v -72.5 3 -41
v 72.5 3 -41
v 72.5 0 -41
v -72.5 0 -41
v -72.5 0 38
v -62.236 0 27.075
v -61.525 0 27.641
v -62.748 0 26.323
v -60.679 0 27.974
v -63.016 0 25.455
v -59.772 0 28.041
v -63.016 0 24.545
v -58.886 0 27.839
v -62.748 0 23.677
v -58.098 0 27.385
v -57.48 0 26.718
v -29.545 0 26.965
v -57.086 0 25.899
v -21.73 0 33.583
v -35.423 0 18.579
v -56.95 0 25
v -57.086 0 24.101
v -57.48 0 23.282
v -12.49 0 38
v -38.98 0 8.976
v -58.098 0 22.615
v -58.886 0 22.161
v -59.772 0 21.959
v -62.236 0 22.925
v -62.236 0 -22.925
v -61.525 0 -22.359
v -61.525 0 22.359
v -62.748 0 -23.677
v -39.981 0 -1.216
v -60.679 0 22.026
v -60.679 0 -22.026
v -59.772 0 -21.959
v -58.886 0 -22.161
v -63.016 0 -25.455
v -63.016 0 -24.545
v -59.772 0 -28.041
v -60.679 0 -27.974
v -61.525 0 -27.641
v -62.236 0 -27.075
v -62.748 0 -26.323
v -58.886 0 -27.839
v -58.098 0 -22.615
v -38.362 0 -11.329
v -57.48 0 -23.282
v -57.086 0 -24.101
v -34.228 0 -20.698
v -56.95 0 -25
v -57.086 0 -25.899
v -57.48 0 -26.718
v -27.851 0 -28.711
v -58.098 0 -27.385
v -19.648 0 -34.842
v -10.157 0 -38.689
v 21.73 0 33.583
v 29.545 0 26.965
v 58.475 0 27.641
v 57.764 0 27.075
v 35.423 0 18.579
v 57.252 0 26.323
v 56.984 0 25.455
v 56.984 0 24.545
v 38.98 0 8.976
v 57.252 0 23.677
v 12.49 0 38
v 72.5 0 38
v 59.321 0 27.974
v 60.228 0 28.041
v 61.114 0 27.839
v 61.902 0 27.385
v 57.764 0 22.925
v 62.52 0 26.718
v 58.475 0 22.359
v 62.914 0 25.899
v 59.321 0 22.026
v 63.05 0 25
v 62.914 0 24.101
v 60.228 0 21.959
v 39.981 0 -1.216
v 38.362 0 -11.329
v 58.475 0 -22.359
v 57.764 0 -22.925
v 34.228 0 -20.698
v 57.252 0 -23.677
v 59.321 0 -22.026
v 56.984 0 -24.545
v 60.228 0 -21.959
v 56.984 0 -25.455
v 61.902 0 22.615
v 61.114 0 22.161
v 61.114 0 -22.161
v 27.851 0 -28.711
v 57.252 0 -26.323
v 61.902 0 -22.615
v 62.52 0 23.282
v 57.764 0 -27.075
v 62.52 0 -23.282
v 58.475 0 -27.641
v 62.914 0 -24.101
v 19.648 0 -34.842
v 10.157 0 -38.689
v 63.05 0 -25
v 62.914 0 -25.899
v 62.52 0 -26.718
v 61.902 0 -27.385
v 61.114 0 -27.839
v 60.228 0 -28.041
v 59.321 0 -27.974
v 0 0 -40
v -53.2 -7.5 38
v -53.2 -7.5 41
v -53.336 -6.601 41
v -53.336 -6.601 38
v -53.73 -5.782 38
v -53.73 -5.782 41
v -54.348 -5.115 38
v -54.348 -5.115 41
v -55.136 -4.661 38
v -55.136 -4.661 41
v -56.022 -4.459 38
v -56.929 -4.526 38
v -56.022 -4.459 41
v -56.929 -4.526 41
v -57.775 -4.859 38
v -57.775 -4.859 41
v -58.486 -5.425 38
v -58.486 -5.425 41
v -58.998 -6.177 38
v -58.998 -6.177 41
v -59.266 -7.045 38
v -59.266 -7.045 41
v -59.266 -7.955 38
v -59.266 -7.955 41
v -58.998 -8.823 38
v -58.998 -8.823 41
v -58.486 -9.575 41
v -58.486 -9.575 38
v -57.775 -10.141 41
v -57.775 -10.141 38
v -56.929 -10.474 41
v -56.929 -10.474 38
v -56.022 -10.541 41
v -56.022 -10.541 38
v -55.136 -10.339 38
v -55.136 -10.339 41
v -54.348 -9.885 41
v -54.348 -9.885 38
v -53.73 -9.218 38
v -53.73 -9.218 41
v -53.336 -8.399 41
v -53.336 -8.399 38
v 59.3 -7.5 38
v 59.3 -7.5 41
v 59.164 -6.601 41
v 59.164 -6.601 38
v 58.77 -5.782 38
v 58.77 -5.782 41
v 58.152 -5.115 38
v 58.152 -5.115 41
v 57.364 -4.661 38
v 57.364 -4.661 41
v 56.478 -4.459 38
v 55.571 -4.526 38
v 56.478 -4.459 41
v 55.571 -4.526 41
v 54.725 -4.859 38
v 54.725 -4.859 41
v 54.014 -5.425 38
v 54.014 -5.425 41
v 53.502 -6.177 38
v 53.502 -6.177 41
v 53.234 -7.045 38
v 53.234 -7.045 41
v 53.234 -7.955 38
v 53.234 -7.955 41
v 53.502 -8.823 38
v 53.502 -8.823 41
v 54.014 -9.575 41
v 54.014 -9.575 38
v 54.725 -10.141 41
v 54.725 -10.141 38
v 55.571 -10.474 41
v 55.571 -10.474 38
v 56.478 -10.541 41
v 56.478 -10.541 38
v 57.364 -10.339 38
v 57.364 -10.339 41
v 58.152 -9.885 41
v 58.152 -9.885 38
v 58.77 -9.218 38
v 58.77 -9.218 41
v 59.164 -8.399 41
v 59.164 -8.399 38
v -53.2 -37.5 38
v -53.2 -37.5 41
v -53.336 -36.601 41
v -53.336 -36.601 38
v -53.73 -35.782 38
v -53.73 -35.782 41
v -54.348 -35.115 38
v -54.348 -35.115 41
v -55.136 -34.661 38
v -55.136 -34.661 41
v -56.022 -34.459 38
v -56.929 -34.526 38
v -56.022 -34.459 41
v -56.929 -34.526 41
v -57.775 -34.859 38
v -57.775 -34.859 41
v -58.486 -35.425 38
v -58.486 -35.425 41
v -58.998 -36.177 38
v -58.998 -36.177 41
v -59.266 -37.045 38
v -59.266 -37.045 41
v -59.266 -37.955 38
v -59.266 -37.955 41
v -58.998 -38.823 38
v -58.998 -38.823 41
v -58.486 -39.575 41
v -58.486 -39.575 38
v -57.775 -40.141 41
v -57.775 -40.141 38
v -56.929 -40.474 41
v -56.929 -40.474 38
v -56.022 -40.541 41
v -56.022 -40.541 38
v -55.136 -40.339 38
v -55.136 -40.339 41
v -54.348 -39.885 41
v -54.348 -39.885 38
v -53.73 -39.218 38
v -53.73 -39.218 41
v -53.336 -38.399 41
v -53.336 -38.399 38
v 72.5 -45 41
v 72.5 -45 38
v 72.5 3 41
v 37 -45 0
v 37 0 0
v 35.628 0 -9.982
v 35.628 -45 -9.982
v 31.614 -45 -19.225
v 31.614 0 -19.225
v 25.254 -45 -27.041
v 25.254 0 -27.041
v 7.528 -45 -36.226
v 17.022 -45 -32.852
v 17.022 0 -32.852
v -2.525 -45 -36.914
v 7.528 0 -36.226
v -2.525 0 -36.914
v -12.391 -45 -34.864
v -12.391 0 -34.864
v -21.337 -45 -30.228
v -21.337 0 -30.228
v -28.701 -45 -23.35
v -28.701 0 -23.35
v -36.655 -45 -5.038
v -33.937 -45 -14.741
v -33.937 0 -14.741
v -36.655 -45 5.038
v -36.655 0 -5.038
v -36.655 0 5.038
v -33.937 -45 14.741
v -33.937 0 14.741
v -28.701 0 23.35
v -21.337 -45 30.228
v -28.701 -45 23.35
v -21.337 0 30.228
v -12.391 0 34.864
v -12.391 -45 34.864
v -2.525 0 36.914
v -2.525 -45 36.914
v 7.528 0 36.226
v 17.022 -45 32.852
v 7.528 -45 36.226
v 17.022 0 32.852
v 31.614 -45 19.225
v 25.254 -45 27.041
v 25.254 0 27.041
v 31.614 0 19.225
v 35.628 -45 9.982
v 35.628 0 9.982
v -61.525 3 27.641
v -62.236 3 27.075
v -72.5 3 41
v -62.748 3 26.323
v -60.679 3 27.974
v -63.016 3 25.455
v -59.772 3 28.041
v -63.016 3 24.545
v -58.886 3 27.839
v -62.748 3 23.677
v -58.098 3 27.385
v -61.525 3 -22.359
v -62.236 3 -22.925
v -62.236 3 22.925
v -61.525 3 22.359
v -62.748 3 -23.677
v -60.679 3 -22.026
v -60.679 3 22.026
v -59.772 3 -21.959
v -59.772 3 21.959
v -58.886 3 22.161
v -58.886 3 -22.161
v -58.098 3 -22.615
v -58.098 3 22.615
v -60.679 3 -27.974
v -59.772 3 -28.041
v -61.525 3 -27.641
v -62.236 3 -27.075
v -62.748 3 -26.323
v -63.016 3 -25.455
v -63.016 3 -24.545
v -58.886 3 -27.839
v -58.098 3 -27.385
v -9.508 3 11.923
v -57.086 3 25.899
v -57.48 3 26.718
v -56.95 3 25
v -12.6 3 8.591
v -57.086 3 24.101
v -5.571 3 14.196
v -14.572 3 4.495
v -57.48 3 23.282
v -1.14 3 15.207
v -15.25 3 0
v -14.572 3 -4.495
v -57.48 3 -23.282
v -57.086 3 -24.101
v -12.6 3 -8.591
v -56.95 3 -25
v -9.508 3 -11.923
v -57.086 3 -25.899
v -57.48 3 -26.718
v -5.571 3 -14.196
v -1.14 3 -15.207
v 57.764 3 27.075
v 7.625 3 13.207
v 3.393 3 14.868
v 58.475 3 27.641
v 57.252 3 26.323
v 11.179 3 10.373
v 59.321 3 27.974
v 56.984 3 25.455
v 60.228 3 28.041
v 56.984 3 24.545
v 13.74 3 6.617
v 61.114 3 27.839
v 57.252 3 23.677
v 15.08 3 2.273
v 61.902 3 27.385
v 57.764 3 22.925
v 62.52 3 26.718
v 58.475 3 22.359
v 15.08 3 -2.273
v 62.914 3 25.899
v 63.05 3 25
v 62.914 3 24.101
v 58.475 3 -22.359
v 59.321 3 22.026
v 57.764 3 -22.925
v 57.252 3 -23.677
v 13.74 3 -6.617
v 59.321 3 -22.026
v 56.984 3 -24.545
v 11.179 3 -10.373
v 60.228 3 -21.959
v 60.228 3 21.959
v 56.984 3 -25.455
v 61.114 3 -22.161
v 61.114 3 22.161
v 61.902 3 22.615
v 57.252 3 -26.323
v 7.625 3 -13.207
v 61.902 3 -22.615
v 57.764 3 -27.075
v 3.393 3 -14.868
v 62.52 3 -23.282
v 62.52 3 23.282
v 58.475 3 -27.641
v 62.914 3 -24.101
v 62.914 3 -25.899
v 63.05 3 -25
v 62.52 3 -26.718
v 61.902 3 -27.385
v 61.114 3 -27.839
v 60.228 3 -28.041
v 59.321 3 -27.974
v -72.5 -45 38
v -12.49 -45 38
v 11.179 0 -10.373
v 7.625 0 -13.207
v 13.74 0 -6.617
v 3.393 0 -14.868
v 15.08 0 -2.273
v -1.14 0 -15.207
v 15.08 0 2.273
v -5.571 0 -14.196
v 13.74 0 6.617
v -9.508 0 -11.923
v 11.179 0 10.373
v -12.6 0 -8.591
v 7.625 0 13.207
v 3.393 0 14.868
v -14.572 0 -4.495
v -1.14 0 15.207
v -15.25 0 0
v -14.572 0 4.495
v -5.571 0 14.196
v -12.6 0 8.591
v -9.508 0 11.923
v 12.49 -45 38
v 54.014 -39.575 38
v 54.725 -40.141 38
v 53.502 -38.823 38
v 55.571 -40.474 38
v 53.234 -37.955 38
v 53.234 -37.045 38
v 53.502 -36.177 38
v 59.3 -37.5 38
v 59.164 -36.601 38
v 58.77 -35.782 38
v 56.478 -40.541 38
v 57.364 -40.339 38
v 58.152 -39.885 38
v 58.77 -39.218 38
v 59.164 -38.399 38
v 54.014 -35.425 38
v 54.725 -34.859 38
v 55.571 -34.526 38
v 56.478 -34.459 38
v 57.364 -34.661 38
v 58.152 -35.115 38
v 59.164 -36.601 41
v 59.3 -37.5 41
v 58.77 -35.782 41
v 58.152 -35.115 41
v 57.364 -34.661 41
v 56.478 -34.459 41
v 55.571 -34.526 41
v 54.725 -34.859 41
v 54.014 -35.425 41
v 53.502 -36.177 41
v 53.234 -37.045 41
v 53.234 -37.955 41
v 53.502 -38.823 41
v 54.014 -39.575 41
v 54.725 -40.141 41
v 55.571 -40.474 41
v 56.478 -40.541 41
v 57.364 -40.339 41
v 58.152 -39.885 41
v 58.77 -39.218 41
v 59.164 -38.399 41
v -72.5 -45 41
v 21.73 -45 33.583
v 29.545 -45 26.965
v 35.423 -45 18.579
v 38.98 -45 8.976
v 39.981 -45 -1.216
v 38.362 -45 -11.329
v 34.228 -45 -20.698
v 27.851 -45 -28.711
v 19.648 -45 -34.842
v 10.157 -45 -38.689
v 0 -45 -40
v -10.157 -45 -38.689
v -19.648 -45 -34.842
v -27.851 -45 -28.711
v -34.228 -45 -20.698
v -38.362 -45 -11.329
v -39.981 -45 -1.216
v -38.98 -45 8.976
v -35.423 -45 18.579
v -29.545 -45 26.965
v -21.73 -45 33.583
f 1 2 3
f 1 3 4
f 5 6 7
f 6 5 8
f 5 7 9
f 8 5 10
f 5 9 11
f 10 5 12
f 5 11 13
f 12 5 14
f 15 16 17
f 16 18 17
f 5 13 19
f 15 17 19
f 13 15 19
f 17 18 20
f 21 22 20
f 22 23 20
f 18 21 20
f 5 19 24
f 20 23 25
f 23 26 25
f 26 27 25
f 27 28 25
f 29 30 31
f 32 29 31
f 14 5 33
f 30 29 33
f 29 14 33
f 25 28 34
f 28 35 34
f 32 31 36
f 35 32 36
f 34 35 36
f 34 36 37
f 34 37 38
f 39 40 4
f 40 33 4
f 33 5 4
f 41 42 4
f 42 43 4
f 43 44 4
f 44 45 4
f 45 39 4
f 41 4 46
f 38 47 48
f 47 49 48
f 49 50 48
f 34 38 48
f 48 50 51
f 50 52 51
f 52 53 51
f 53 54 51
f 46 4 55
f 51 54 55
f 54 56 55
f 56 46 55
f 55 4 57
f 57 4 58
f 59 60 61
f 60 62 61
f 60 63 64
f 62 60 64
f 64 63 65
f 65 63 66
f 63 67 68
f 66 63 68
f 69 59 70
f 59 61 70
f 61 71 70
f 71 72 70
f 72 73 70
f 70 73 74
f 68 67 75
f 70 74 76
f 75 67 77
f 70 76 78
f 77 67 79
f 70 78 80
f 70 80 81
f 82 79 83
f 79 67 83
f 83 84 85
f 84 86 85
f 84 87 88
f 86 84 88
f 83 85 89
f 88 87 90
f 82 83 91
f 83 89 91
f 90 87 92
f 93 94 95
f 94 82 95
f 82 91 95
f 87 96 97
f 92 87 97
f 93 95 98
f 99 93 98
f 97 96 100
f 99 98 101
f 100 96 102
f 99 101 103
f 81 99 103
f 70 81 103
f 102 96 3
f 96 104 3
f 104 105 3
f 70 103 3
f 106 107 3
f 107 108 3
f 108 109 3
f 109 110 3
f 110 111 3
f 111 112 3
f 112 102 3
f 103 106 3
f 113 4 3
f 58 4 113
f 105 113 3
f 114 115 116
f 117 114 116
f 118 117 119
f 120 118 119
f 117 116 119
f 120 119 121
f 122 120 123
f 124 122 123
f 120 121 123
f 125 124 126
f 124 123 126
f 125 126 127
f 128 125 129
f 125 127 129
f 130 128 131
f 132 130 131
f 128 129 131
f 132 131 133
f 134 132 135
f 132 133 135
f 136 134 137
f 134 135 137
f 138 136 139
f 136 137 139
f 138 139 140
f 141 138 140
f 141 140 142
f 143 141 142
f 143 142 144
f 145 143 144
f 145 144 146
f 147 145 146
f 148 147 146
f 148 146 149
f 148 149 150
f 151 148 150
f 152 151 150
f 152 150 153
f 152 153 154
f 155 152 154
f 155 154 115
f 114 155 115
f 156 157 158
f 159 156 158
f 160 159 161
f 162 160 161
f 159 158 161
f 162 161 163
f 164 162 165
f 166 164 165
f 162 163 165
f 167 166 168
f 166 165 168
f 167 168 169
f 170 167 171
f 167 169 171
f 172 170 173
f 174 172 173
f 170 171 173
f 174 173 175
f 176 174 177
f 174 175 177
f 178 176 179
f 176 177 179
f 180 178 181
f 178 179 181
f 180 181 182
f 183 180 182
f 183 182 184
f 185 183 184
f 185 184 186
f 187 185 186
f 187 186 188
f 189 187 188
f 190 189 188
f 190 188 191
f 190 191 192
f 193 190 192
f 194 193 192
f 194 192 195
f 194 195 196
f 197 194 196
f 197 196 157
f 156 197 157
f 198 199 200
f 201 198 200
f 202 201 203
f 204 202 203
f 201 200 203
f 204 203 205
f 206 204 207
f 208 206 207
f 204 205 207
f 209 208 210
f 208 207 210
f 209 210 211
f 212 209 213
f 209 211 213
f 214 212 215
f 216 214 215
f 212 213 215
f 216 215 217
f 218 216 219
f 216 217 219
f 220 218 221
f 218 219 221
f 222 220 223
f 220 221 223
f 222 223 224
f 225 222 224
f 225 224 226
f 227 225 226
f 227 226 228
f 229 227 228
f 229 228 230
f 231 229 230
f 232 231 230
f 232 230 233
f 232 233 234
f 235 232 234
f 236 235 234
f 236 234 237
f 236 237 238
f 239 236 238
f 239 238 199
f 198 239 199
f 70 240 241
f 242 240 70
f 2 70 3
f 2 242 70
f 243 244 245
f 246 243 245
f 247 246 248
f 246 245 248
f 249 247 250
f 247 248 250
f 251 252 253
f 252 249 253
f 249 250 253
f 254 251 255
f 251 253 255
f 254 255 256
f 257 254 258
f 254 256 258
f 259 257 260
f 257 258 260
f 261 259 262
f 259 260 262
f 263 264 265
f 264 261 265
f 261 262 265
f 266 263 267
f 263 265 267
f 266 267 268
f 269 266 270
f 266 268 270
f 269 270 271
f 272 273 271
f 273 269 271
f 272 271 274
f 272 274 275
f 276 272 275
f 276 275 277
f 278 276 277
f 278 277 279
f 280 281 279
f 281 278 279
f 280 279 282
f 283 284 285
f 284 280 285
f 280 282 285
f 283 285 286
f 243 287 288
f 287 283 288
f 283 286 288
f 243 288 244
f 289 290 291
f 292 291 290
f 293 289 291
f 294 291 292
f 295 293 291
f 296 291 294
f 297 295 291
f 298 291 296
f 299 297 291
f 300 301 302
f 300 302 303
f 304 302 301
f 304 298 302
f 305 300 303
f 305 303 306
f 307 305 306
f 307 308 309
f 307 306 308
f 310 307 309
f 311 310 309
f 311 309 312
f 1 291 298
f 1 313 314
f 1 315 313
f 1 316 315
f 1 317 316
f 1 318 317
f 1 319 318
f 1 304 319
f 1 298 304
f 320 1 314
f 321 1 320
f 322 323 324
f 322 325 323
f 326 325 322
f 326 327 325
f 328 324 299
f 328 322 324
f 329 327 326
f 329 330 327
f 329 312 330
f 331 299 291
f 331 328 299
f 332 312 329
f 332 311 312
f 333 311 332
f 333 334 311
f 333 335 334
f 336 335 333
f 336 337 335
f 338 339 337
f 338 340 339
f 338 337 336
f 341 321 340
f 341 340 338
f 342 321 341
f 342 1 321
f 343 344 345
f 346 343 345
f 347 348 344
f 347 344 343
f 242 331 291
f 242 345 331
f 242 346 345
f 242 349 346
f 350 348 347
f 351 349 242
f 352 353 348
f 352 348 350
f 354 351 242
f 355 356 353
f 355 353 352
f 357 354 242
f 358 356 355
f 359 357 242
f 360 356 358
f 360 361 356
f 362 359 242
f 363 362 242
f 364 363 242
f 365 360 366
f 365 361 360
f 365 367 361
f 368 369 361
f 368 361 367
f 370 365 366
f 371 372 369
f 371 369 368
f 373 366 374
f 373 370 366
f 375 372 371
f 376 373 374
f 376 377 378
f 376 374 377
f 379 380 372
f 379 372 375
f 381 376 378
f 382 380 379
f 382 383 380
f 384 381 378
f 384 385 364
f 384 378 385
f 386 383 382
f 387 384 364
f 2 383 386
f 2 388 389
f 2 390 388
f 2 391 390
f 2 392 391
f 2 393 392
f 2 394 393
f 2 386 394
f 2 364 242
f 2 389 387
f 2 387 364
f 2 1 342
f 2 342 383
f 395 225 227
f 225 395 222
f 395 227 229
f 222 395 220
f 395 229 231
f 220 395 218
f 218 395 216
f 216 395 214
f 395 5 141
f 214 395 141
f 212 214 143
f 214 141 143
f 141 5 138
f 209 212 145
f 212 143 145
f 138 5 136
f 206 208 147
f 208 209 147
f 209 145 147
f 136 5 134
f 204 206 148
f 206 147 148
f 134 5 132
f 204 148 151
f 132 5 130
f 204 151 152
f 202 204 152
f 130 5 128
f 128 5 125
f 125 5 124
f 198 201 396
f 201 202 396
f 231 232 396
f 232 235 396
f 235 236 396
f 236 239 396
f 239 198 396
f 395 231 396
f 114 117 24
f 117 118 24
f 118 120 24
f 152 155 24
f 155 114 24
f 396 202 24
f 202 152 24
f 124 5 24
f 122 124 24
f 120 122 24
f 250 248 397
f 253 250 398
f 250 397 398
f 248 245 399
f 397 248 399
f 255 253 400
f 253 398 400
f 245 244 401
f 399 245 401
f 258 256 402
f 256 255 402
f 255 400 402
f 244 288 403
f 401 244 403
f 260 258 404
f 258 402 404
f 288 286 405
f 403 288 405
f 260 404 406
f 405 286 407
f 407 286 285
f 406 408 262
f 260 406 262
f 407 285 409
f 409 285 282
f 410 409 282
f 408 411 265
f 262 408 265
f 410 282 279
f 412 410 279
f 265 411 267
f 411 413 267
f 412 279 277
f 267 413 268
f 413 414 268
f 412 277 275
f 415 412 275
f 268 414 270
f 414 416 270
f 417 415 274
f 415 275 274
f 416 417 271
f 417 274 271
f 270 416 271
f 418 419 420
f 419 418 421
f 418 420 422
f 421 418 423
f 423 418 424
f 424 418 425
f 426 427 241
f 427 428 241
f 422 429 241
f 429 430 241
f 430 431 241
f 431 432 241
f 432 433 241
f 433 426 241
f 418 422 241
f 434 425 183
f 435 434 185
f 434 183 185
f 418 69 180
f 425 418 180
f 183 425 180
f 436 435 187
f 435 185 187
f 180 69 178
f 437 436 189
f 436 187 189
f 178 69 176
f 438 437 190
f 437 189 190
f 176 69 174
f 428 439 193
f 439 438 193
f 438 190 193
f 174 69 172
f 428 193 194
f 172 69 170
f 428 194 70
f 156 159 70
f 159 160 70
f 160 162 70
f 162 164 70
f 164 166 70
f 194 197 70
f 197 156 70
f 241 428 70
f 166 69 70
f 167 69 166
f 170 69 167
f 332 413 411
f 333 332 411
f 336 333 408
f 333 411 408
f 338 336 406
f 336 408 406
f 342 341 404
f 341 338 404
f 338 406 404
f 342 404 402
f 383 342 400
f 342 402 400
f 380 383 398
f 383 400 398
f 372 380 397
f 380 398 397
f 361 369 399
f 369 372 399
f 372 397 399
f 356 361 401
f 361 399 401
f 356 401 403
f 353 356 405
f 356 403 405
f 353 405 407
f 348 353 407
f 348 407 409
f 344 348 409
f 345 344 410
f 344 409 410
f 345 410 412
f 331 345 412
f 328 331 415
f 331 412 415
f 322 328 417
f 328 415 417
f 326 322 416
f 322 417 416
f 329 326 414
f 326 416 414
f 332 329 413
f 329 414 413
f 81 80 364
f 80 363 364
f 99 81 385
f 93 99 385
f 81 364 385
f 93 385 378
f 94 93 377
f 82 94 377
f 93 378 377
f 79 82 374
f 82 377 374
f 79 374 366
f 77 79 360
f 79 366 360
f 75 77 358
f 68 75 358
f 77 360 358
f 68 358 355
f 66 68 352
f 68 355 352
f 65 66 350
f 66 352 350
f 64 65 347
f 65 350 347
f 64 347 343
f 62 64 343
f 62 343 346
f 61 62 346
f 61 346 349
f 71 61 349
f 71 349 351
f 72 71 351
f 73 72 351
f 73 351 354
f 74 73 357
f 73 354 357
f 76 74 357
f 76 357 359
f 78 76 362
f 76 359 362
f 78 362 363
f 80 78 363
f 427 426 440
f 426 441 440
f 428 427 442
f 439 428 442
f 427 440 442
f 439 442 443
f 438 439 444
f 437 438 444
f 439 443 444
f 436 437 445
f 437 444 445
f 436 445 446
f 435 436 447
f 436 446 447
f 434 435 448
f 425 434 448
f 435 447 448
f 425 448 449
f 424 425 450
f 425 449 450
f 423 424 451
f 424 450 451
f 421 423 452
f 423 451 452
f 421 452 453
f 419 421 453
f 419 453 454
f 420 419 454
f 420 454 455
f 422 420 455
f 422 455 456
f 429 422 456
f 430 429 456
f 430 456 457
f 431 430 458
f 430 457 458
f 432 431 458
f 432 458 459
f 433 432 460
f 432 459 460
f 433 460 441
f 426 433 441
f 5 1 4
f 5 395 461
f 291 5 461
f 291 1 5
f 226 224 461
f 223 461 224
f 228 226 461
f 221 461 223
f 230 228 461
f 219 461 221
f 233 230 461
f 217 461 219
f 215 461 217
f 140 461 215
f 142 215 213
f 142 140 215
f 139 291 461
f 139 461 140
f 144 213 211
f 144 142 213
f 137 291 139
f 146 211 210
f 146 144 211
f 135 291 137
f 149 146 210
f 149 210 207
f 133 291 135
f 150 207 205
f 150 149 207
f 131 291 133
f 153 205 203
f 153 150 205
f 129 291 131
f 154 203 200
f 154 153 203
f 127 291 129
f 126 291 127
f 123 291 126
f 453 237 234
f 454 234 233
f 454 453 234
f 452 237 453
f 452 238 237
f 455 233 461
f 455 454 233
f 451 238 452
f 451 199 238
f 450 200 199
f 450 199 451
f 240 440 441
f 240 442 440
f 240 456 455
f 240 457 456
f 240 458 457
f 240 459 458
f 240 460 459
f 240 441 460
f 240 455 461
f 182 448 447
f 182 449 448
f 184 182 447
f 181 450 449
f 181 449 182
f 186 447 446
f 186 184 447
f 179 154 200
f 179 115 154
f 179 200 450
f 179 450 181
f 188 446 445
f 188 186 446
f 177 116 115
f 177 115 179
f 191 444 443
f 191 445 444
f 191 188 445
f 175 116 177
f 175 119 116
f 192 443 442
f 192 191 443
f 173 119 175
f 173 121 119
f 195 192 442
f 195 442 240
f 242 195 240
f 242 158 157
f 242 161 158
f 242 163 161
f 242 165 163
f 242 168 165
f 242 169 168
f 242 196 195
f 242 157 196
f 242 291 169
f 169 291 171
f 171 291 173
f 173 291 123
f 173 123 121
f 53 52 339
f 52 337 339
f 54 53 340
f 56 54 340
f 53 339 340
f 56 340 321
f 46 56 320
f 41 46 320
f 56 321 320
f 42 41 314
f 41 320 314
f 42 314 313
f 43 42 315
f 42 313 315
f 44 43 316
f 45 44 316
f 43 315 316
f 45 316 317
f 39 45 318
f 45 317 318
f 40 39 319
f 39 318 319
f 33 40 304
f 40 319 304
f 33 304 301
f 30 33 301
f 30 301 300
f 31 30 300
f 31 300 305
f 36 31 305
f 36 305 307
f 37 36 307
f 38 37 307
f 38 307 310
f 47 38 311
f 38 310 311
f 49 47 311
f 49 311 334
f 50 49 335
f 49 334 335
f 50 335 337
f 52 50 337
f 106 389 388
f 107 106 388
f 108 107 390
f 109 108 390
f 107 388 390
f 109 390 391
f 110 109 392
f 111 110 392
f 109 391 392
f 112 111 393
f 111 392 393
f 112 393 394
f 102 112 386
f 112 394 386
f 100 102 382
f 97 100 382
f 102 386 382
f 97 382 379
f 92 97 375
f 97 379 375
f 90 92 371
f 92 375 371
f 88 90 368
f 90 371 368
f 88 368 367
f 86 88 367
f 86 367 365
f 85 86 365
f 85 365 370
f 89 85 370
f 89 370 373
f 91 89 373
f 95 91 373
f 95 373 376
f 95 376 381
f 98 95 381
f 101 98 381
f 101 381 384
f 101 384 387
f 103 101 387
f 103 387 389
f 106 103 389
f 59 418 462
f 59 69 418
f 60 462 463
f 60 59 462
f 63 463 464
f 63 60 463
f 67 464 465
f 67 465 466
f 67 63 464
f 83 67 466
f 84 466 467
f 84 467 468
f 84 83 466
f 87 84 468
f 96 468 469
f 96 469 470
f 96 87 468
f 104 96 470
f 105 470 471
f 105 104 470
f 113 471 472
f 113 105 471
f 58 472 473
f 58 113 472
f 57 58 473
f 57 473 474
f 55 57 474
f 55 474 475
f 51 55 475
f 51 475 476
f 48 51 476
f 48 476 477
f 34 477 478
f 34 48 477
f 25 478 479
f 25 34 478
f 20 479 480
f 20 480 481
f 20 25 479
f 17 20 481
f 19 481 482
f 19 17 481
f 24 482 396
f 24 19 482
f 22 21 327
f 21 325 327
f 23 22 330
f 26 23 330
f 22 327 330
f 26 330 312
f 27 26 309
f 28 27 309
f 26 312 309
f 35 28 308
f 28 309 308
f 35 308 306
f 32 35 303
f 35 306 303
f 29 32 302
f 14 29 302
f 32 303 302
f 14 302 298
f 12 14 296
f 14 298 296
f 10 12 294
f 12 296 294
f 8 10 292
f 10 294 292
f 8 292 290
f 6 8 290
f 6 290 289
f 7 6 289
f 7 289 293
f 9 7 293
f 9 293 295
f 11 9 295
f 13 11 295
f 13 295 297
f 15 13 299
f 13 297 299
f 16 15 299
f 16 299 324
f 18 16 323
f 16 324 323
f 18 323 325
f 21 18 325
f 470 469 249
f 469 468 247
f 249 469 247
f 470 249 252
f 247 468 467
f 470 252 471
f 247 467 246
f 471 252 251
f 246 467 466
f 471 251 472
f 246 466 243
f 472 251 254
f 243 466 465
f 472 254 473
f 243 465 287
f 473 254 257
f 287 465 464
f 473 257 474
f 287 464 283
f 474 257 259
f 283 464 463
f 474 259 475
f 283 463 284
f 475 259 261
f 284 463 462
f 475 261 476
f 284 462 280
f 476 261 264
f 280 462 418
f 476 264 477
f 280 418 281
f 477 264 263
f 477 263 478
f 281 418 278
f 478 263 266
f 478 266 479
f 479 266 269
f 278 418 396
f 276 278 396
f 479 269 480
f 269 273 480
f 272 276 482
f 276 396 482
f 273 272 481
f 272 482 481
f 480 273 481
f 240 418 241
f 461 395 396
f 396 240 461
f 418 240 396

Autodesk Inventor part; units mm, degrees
ref_plane "YZ Plane" through (0, 0, 0) normal (1, 0, 0) x (0, 1, 0)
ref_plane "XZ Plane" through (0, 0, 0) normal (0, 1, 0) x (-1, 0, 0)
ref_plane "XY Plane" through (0, 0, 0) normal (0, 0, 1) x (1, 0, 0)
sketch "Sketch1" plane through (0, 0, 0) normal (0, 1, 0) x (-1, 0, 0)
  circle A0 centre (0, 0) radius 15.25
  circle A1 centre (0, 0) radius 32.5 construction
  line L0 (0, 0) -> (0, -32.5) construction
  line L1 (0, 0) -> (-22.981, -22.981) construction
  circle A2 centre (-22.981, -22.981) radius 3.05 construction
  circle A3 centre (22.981, -22.981) radius 3.05 construction
  circle A4 centre (22.981, 22.981) radius 3.05 construction
  circle A5 centre (-22.981, 22.981) radius 3.05 construction
  circle A6 centre (0, 0) radius 40
  circle A7 centre (22.981, -22.981) radius 5 construction
  dimension "d0" = 30.5
  dimension "d1" = 6.1
  dimension "d3" = 45
  dimension "d4" = 65
  dimension "d7" = 360
  dimension "d9" = 80
  dimension "d10" = 10
extrude "Extrusion1" add sketch "Sketch1" along normal blind 3
sketch "Sketch2" plane through (0, 0, 0) normal (0, -1, 0) x (1, 0, 0)
  circle A0 centre (0, 0) radius 40 projected
  circle A1 centre (0, 0) radius 37
  dimension "d13" = 3
extrude "Extrusion2" add sketch "Sketch2" along normal blind 45
sketch "Sketch3" plane through (0, 3, 0) normal (0, 1, 0) x (1, 0, 0)
  line L0 (-72.5, -41) -> (72.5, -41)
  line L1 (72.5, -41) -> (72.5, 41)
  line L2 (72.5, 41) -> (-72.5, 41)
  line L3 (-72.5, 41) -> (-72.5, -41)
  line L4 (-72.5, -41) -> (72.5, 41) construction
  line L5 (72.5, -41) -> (-72.5, 41) construction
  circle A0 centre (0, 0) radius 40 projected
  circle A1 centre (0, 0) radius 15.25 projected
  line L6 (-60, -25) -> (60, -25) construction
  line L7 (60, -25) -> (60, 25) construction
  line L8 (60, 25) -> (-60, 25) construction
  line L9 (-60, 25) -> (-60, -25) construction
  line L10 (-60, -25) -> (60, 25) construction
  line L11 (60, -25) -> (-60, 25) construction
  circle A2 centre (-60, 25) radius 3.05
  circle A3 centre (-60, -25) radius 3.05
  circle A4 centre (60, 25) radius 3.05
  circle A5 centre (60, -25) radius 3.05
  dimension "d16" = 145
  dimension "d17" = 82
  dimension "d18" = 120
  dimension "d19" = 50
  dimension "d20" = 6.1
extrude "Extrusion3" add sketch "Sketch3" against normal blind 3 contours L3 L2 L1 L0
sketch "Sketch4" plane through (-72.5, 3, 41) normal (0, 0, 1) x (1, 0, 0)
  line L0 (32.5, -3) -> (112.5, -3) projected
  line L1 (32.5, -48) -> (112.5, -48) projected
  line L2 (0, 0) -> (145, 0) projected
  line L3 (0, 0) -> (0, -3) projected
  line L4 (145, -3) -> (0, -3) projected
  line L5 (145, 0) -> (145, -3) projected
  line L6 (0, 0) -> (0, -3) projected
  line L7 (32.5, -48) -> (112.5, -48) projected
  line L8 (0, -3) -> (32.5, -3)
  line L9 (32.5, -3) -> (32.5, -48)
  line L10 (32.5, -48) -> (0, -48)
  line L11 (0, -48) -> (0, -3)
  line L12 (112.5, -48) -> (145, -48)
  line L13 (145, -48) -> (145, -3)
  line L14 (145, -3) -> (112.5, -3)
  line L15 (112.5, -3) -> (112.5, -48)
  line L16 (16.25, -48) -> (16.25, -3) construction
  line L17 (145, -3) -> (0, -3) projected
  line L18 (128.75, -48) -> (128.75, -3) construction
  circle A0 centre (16.25, -40.5) radius 3.05
  line L19 (16.25, -40.5) -> (128.75, -40.5) construction
  line L20 (128.75, -40.5) -> (128.75, -10.5) construction
  line L21 (128.75, -10.5) -> (16.25, -10.5) construction
  line L22 (16.25, -10.5) -> (16.25, -40.5) construction
  circle A1 centre (16.25, -10.5) radius 3.05
  circle A2 centre (128.75, -10.5) radius 3.05
  circle A3 centre (128.75, -40.5) radius 3.05
  point P0 (72.5, -3)
  dimension "d23" = 30
  dimension "d24" = 7.5
  dimension "d25" = 6.1
extrude "Extrusion4" add sketch "Sketch4" against normal blind 3 contours L9 L10 L11 L4 | L0 L15 L1 L9 | L4 L13 L12 L15
properties part number "WheelHolder" material "Aluminum 6061-AHC"
